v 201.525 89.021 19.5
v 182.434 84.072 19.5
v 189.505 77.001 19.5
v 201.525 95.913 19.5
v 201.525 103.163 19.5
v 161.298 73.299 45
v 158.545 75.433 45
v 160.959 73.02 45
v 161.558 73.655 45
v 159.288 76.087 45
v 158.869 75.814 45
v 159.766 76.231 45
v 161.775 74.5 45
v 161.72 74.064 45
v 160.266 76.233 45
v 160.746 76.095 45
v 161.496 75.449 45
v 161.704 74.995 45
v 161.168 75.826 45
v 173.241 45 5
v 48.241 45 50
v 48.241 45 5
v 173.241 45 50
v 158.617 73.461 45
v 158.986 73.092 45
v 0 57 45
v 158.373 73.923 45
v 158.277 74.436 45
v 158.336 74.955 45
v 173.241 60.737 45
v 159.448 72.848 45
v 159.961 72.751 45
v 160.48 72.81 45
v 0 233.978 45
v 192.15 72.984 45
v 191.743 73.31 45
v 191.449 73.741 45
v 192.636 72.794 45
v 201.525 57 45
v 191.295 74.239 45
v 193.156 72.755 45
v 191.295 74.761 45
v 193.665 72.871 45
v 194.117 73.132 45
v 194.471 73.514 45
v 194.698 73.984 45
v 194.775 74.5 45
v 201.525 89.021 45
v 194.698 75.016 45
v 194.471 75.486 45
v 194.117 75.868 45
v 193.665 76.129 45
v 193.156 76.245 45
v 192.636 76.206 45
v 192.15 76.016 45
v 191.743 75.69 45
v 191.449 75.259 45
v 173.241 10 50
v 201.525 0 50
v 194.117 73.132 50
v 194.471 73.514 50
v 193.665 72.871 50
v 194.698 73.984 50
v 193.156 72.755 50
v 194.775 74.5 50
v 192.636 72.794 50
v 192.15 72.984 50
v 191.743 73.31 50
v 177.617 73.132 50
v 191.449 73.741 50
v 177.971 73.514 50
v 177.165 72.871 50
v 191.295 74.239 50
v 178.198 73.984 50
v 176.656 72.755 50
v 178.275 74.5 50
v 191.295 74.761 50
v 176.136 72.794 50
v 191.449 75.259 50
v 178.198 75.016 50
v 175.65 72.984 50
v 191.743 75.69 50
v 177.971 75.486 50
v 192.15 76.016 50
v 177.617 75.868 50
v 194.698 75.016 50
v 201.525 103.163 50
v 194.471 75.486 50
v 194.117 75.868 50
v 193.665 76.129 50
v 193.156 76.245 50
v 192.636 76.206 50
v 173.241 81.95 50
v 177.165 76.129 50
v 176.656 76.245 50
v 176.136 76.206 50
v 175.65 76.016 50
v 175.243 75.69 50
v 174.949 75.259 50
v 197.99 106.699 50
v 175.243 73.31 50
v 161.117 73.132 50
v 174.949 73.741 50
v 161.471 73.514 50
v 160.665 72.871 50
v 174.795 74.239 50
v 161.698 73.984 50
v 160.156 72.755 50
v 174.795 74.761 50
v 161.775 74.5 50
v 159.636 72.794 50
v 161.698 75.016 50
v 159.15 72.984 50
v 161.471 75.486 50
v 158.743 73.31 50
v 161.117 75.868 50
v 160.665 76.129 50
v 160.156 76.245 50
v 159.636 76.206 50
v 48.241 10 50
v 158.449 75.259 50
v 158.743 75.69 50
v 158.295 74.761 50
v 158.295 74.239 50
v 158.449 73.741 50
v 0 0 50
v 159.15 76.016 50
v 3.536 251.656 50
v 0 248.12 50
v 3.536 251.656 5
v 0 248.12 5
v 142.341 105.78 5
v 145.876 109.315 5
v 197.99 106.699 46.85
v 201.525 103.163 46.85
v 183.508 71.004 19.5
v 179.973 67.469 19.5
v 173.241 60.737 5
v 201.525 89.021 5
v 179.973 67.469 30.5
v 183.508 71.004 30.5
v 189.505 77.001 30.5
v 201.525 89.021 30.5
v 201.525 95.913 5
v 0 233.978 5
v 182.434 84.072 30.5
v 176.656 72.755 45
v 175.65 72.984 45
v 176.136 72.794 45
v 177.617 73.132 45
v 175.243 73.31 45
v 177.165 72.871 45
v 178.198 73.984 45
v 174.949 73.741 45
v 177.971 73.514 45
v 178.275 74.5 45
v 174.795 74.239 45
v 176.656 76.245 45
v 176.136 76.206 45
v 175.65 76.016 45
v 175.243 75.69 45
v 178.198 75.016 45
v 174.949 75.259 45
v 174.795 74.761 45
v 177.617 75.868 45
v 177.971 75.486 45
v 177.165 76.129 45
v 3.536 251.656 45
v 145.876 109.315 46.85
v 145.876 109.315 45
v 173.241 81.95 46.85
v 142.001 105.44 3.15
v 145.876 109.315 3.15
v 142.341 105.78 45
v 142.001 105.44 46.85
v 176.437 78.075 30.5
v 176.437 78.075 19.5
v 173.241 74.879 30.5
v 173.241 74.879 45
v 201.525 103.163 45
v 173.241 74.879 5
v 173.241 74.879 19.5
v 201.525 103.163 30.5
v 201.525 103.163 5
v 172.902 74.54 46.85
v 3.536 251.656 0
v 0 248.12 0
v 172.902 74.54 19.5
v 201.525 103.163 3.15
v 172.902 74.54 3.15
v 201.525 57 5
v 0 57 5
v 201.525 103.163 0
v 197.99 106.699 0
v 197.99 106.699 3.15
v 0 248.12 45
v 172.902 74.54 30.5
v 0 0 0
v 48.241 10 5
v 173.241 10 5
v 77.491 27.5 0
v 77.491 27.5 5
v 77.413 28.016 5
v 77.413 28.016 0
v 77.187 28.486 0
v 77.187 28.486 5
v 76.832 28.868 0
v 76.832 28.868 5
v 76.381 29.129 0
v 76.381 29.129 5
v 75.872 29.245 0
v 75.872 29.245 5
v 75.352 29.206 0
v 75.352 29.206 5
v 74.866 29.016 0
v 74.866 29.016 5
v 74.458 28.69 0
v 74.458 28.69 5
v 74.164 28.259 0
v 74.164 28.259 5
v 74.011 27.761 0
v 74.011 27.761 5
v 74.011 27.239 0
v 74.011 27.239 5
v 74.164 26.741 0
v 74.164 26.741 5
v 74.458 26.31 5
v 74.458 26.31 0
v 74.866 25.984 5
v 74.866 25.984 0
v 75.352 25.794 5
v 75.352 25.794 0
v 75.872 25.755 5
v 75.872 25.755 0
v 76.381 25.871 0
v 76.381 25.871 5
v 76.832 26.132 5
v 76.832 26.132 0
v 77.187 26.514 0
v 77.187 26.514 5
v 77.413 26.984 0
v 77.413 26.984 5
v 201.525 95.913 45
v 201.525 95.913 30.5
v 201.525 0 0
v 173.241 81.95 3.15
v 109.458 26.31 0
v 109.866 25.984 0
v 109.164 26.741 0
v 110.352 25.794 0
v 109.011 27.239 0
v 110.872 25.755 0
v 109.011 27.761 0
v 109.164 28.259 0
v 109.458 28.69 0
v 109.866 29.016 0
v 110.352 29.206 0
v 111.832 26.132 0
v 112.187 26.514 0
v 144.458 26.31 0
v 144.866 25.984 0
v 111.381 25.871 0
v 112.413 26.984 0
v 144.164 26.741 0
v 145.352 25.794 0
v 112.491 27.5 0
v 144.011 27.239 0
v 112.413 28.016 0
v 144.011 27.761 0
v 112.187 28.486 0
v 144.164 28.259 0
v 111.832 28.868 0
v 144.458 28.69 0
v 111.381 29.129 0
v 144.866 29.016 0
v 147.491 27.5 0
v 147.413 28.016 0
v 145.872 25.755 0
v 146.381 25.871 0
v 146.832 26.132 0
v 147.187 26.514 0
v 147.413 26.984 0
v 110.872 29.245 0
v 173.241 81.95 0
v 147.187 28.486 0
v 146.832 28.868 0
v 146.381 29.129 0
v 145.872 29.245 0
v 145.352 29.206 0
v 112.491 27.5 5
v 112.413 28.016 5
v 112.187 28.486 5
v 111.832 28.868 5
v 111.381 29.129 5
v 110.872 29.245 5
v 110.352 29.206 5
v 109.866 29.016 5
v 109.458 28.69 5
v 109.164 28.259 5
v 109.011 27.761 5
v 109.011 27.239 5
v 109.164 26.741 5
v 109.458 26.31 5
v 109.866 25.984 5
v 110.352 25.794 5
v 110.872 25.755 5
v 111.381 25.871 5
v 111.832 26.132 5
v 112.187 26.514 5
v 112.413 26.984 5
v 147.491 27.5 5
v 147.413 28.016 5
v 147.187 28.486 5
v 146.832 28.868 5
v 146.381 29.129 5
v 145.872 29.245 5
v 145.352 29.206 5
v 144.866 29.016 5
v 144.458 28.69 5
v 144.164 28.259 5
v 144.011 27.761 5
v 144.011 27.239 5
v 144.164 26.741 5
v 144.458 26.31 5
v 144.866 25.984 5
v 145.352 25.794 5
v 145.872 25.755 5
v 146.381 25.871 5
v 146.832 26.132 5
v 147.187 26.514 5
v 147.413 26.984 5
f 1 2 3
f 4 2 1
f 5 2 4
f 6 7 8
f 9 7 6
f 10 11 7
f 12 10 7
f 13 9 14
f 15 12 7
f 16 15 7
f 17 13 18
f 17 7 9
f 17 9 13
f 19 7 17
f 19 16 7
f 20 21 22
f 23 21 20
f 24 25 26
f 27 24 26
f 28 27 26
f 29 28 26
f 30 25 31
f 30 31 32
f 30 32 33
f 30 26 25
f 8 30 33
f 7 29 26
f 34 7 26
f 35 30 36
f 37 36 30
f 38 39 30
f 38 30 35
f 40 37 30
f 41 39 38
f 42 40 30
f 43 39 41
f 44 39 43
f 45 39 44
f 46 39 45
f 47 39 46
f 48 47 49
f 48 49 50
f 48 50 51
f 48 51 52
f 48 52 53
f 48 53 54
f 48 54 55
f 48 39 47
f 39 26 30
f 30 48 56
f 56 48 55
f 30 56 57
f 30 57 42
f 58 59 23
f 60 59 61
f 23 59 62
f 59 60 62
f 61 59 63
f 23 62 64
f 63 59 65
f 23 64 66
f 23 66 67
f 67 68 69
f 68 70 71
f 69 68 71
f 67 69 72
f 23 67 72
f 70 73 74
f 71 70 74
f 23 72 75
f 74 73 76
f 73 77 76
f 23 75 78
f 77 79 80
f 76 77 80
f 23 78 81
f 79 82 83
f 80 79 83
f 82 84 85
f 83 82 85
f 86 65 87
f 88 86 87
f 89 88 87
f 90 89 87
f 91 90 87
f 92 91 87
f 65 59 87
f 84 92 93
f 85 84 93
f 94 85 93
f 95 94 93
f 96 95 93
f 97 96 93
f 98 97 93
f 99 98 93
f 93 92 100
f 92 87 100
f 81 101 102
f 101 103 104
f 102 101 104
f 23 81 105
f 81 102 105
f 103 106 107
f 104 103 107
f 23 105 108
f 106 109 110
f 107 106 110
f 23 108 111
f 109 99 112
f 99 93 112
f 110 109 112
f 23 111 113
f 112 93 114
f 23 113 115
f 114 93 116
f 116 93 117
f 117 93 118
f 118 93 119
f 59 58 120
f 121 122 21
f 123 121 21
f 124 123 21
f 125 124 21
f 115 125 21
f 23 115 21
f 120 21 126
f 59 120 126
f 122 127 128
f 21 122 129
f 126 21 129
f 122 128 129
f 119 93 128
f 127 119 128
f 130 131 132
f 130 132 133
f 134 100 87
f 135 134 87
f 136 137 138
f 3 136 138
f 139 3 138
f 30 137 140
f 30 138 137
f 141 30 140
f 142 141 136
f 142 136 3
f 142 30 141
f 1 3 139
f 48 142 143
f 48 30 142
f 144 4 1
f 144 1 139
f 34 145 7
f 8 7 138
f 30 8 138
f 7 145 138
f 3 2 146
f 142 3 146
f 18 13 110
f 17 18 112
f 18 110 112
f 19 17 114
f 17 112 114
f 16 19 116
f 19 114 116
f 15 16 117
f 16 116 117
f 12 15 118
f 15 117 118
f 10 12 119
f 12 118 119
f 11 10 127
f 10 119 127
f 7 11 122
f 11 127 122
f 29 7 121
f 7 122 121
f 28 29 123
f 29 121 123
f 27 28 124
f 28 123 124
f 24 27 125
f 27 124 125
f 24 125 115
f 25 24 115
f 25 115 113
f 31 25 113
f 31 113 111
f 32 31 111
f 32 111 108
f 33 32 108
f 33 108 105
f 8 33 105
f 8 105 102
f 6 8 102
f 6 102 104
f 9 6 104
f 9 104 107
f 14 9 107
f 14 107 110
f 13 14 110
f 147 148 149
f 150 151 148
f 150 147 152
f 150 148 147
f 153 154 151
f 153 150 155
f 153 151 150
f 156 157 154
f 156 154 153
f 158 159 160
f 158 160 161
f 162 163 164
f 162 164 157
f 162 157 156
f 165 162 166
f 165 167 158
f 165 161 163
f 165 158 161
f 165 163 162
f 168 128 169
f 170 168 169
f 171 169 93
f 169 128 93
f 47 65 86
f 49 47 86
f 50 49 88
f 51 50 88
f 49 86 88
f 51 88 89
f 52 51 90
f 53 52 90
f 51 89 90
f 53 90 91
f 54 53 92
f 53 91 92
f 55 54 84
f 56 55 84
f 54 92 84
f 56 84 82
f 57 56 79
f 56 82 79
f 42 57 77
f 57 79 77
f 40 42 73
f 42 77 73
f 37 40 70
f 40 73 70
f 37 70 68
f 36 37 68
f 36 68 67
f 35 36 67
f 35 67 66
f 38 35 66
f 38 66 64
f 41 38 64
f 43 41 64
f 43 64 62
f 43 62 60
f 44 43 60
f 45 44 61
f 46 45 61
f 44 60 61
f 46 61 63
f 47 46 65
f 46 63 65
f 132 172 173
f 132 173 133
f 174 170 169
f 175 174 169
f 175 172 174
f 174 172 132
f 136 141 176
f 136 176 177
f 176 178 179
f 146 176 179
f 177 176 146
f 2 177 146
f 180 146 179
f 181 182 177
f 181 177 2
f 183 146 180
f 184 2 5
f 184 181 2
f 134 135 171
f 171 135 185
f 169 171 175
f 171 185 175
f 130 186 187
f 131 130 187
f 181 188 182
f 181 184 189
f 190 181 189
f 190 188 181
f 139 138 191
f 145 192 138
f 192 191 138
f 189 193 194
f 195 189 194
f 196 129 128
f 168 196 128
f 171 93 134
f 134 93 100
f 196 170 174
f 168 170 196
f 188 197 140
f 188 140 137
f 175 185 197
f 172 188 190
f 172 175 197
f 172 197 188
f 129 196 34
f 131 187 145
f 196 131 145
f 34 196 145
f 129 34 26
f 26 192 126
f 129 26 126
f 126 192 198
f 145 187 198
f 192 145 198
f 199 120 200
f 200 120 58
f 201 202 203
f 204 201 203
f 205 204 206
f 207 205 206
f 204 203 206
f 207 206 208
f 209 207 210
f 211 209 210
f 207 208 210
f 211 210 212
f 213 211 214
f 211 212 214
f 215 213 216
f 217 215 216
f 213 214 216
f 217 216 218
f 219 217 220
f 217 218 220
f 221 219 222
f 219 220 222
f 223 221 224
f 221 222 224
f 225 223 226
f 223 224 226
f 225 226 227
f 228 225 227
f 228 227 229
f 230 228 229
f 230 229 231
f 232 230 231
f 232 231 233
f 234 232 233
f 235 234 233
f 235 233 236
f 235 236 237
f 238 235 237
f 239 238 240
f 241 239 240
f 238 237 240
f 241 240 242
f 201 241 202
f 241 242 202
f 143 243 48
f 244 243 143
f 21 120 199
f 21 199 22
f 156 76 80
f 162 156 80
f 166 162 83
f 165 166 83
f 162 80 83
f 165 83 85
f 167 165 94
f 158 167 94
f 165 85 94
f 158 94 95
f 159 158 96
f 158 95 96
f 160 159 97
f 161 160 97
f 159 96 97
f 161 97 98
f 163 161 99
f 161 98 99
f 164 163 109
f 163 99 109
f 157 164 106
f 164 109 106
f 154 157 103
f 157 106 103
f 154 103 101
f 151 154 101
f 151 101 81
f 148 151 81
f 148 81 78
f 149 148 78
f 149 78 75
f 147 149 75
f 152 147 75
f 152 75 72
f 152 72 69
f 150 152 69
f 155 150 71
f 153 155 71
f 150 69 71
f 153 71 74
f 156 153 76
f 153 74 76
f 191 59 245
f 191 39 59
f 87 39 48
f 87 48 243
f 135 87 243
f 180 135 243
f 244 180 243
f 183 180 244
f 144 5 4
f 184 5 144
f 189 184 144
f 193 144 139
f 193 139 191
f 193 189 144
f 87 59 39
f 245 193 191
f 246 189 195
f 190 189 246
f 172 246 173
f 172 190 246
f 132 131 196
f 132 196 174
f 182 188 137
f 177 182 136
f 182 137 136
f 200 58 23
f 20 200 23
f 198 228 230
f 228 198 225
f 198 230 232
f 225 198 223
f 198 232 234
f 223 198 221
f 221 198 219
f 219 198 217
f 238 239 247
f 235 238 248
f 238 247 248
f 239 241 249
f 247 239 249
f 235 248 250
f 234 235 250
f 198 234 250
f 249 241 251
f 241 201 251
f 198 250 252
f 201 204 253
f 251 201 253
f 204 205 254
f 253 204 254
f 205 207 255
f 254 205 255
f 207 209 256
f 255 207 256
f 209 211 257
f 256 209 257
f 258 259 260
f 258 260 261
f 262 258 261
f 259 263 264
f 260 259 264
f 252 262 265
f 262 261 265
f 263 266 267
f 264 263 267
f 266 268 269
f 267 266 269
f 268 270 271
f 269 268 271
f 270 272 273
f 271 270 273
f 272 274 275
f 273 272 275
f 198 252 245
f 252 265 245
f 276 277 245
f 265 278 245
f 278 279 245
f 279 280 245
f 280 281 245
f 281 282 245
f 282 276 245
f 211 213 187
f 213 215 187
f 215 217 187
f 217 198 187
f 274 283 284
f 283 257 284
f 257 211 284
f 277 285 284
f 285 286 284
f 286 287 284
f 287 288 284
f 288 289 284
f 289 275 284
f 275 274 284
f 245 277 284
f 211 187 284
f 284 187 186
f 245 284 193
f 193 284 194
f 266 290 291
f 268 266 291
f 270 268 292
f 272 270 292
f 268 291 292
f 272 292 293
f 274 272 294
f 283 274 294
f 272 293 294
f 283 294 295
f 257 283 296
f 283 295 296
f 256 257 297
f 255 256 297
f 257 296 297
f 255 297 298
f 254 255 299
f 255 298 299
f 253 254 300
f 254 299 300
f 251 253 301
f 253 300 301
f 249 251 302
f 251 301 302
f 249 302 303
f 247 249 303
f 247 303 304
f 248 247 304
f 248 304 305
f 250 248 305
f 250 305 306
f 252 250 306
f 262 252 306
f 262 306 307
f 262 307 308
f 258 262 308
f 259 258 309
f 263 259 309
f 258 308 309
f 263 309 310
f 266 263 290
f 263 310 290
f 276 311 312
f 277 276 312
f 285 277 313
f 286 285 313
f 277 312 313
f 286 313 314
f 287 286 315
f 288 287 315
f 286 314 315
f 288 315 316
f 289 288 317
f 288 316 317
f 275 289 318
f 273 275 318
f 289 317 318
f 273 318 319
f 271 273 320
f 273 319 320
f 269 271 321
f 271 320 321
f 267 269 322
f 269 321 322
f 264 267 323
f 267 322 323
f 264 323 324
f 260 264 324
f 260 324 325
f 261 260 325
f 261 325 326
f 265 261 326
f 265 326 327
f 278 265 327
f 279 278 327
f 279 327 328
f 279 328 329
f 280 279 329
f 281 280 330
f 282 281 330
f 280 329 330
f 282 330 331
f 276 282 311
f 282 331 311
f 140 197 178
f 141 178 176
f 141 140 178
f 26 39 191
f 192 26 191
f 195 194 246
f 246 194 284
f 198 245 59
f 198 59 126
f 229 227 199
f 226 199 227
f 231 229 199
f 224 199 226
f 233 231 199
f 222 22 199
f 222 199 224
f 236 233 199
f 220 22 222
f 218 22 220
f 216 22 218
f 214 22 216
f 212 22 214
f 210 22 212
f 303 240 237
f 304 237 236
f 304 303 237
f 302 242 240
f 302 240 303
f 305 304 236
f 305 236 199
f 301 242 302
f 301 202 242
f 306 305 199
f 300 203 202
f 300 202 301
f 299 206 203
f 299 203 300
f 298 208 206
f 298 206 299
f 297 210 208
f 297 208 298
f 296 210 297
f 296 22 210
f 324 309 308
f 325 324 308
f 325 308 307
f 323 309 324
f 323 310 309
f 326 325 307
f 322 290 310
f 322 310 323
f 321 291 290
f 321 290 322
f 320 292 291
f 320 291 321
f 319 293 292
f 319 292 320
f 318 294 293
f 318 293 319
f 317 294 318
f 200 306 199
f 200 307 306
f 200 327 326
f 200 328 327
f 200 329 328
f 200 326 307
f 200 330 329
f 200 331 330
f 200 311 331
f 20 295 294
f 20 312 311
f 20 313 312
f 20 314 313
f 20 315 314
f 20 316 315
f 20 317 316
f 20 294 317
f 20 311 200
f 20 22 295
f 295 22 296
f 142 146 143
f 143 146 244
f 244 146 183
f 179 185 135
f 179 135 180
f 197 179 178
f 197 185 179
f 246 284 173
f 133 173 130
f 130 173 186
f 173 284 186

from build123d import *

# Parameters (mm, degrees)
BOSS_EXTRUDE1_DEPTH              = 50
CUT_EXTRUDE1_REACH               = 346.227
CUT_EXTRUDE1_OFFSET_FROM_SURFACE = 10
SKETCH7_W                        = 40
SKETCH7_H                        = 243.120368846
CUT_EXTRUDE2_REACH               = 336.227
SKETCH8_W                        = 40
SKETCH8_H                        = 80.210678119
BOSS_EXTRUDE2_DEPTH              = 5
BOSS_EXTRUDE3_DEPTH              = 5
SKETCH12_W                       = 11
SKETCH12_H                       = 50
CUT_EXTRUDE3_DEPTH               = 20
SKETCH13_W                       = 50
SKETCH13_H                       = 57
BOSS_EXTRUDE4_DEPTH              = 218.275432638
CUT_EXTRUDE5_DEPTH               = 185.855610396
CUT_EXTRUDE5_DEPTH_BACK          = 0.48
SKETCH14_W                       = 40
SKETCH14_H                       = 43.7
SKETCH14_W_2                     = 1.85
CUT_EXTRUDE6_START               = -10
SKETCH15_W                       = 5.5
SKETCH15_H                       = 5
CUT_EXTRUDE6_DEPTH               = 10
SKETCH16_W                       = 125
SKETCH16_H                       = 35
CUT_EXTRUDE7_DEPTH               = 45
CUT_EXTRUDE8_DEPTH               = 5
CUT_EXTRUDE9_DEPTH               = 16.750003
CUT_EXTRUDE10_REACH              = 266.941
SKETCH19_W                       = 6.892135624
SKETCH19_H                       = 14.5
SKETCH20_R                       = 1.75
CUT_EXTRUDE11_DEPTH              = 5


with BuildPart() as part:
    # Sketch2 → Boss-Extrude1 (new body)
    with BuildSketch(Plane.XY):
        Polygon((218.275432638, 103.163478703), (218.275432638, 0), (0, 0), (0, 44.039493547), (0, 248.120368846), (173.241161391, 74.879207455), (201.525432638, 103.163478703), align=None)
    extrude(amount=BOSS_EXTRUDE1_DEPTH)

    # Cut-Extrude1: up to this face of the body (flat: up to its plane, moved by the offset)
    cut_extrude1_end = Plane(part.part.faces().sort_by_distance((86.620580695, 161.499788151, 25))[0]).offset(-CUT_EXTRUDE1_OFFSET_FROM_SURFACE)
    # Sketch7 → Cut-Extrude1 (cut, up to the picked face)
    with BuildSketch(Plane.ZY, mode=Mode.PRIVATE) as cut_extrude1_sk1:
        with Locations((25, 121.560184423)):
            Rectangle(SKETCH7_W, SKETCH7_H)
    cut_extrude1_tool1 = split(extrude(cut_extrude1_sk1.sketch, amount=-CUT_EXTRUDE1_REACH, mode=Mode.PRIVATE), bisect_by=cut_extrude1_end, keep=Keep.BOTH, mode=Mode.PRIVATE)
    add(cut_extrude1_tool1.solids().sort_by(Axis((0, 121.560184, 25), (1, 0, 0)))[0], mode=Mode.SUBTRACT)

    # Cut-Extrude2: up to this plane
    cut_extrude2_end = Plane(origin=(180.312229203, 67.808139643, 50), z_dir=(0.7071067811865477, -0.7071067811865474, 0))
    # Sketch8 → Cut-Extrude2 (cut, up to the surface)
    with BuildSketch(Plane(origin=(218.275432638, 0, 0), x_dir=(0, 0, -1), z_dir=(1, 0, 0)), mode=Mode.PRIVATE) as cut_extrude2_sk1:
        with Locations((-25, 55.808139644)):
            Rectangle(SKETCH8_W, SKETCH8_H)
    cut_extrude2_tool1 = split(extrude(cut_extrude2_sk1.sketch, amount=-CUT_EXTRUDE2_REACH, mode=Mode.PRIVATE), bisect_by=cut_extrude2_end, keep=Keep.BOTH, mode=Mode.PRIVATE)
    add(cut_extrude2_tool1.solids().sort_by_distance((218.275433, 55.80814, 25))[0], mode=Mode.SUBTRACT)

    # Sketch10 → Boss-Extrude2 (add)
    with BuildSketch(Plane.XY.offset(50)):
        Polygon((0, 248.120368846), (3.535533906, 251.655902752), (173.241161391, 81.950275267), (197.989898732, 106.699012609), (201.525432638, 103.163478703), (173.241161391, 74.879207455), align=None)
    extrude(amount=-BOSS_EXTRUDE2_DEPTH)

    # Sketch11 → Boss-Extrude3 (add)
    with BuildSketch(Plane(origin=(0, 0, 0), x_dir=(-1, 0, 0), z_dir=(0, 0, -1))):
        Polygon((-201.525432638, 103.163478703), (-197.989898732, 106.699012609), (-173.241161391, 81.950275267), (-3.535533906, 251.655902752), (0, 248.120368846), (-173.241161391, 74.879207455), align=None)
    extrude(amount=-BOSS_EXTRUDE3_DEPTH)

    # Sketch12 → Cut-Extrude3 (cut)
    with BuildSketch(Plane(origin=(49.180976968, -49.180976968, 0), x_dir=(0, 0, 1), z_dir=(-0.7071067811865435, 0.7071067811865517, 0))):
        with Locations((25, 213.447595361)):
            Rectangle(SKETCH12_W, SKETCH12_H)
    extrude(amount=-CUT_EXTRUDE3_DEPTH, mode=Mode.SUBTRACT)

    # Sketch13 → Boss-Extrude4 (add)
    with BuildSketch(Plane(origin=(218.275432638, 0, 0), x_dir=(0, 0, -1), z_dir=(1, 0, 0))):
        with Locations((-25, 28.5)):
            Rectangle(SKETCH13_W, SKETCH13_H)
    extrude(amount=-BOSS_EXTRUDE4_DEPTH)

    # Sketch14 → Cut-Extrude5 (cut, two sides: drawn at the far end of the back side and taken through both)
    with BuildSketch(Plane(origin=(124.060184423, 124.060184423, 0), x_dir=(0, 0, -1), z_dir=(0.7071067811865435, 0.7071067811865517, 0)).offset(-CUT_EXTRUDE5_DEPTH_BACK)):
        with Locations((-25, -47.702404639)):
            Rectangle(SKETCH14_W, SKETCH14_H)
        with Locations((-45.925, -47.702404639)):
            Rectangle(SKETCH14_W_2, SKETCH14_H)
        with Locations((-4.075, -47.702404639)):
            Rectangle(SKETCH14_W_2, SKETCH14_H)
    extrude(amount=CUT_EXTRUDE5_DEPTH + CUT_EXTRUDE5_DEPTH_BACK, mode=Mode.SUBTRACT)

    # Sketch15 → Cut-Extrude6 (cut)
    with BuildSketch(Plane(origin=(49.180976968, -49.180976968, 0), x_dir=(0, 0, 1), z_dir=(-0.7071067811865477, 0.7071067811865474, 0)).offset(CUT_EXTRUDE6_START)):
        with Locations((27.75, 177.467595361)):
            Rectangle(SKETCH15_W, SKETCH15_H)
        with Locations((22.25, 177.467595361)):
            Rectangle(SKETCH15_W, SKETCH15_H)
    extrude(amount=CUT_EXTRUDE6_DEPTH, mode=Mode.SUBTRACT)

    # Sketch16 → Cut-Extrude7 (cut)
    with BuildSketch(Plane.XY.offset(50)):
        with Locations((110.741161391, 27.5)):
            Rectangle(SKETCH16_W, SKETCH16_H)
    extrude(amount=-CUT_EXTRUDE7_DEPTH, mode=Mode.SUBTRACT)

    # Sketch17 → Cut-Extrude8 (cut)
    with BuildSketch(Plane.XY.offset(5)):
        with BuildLine():
            ThreePointArc((73.991161391, 27.5), (75.741161391, 25.75), (77.491161391, 27.5))
            Line((77.491161391, 27.5), (73.991161391, 27.5))
        make_face()
        with BuildLine():
            Line((73.991161391, 27.5), (77.491161391, 27.5))
            ThreePointArc((77.491161391, 27.5), (75.741161391, 29.25), (73.991161391, 27.5))
        make_face()
        with BuildLine():
            ThreePointArc((108.991161391, 27.5), (110.741161391, 25.75), (112.491161391, 27.5))
            Line((112.491161391, 27.5), (108.991161391, 27.5))
        make_face()
        with BuildLine():
            Line((108.991161391, 27.5), (112.491161391, 27.5))
            ThreePointArc((112.491161391, 27.5), (110.741161391, 29.25), (108.991161391, 27.5))
        make_face()
        with BuildLine():
            ThreePointArc((143.991161391, 27.5), (145.741161391, 25.75), (147.491161391, 27.5))
            Line((147.491161391, 27.5), (143.991161391, 27.5))
        make_face()
        with BuildLine():
            Line((143.991161391, 27.5), (147.491161391, 27.5))
            ThreePointArc((147.491161391, 27.5), (145.741161391, 29.25), (143.991161391, 27.5))
        make_face()
    extrude(amount=-CUT_EXTRUDE8_DEPTH, mode=Mode.SUBTRACT)

    # Sketch18 → Cut-Extrude9 (cut)
    with BuildSketch(Plane(origin=(218.275432638, 0, 0), x_dir=(0, 0, -1), z_dir=(1, 0, 0))):
        Polygon((-5, 95.913478703), (-5, 57), (-45, 57), (-45, 95.913478703), (-30.5, 95.913478703), (-30.5, 103.163478703), (-50, 103.163478703), (-50, 0), (0, 0), (0, 103.163478703), (-19.5, 103.163478703), (-19.5, 95.913478703), align=None)
    extrude(amount=-CUT_EXTRUDE9_DEPTH, mode=Mode.SUBTRACT)

    # Sketch19 → Cut-Extrude10 (cut, up to next)
    with BuildSketch(Plane(origin=(0, 95.913478703, 0), x_dir=(1, 0, 0), z_dir=(0, 1, 0)), mode=Mode.PRIVATE) as cut_extrude10_sk1:
        with Locations((204.97150045, -37.75)):
            Rectangle(SKETCH19_W, SKETCH19_H)
    cut_extrude10_tool1 = extrude(cut_extrude10_sk1.sketch, amount=-CUT_EXTRUDE10_REACH, mode=Mode.PRIVATE) & part.part
    # Sketch19 → Cut-Extrude10 (cut, up to next)
    with BuildSketch(Plane(origin=(0, 95.913478703, 0), x_dir=(1, 0, 0), z_dir=(0, 1, 0)), mode=Mode.PRIVATE) as cut_extrude10_sk2:
        with Locations((204.97150045, -12.25)):
            Rectangle(SKETCH19_W, SKETCH19_H)
    cut_extrude10_tool2 = extrude(cut_extrude10_sk2.sketch, amount=-CUT_EXTRUDE10_REACH, mode=Mode.PRIVATE) & part.part
    add(cut_extrude10_tool1.solids().sort_by_distance((204.9715, 95.913479, 37.75))[0], mode=Mode.SUBTRACT)
    add(cut_extrude10_tool2.solids().sort_by_distance((204.9715, 95.913479, 12.25))[0], mode=Mode.SUBTRACT)

    # Sketch20 → Cut-Extrude11 (cut)
    with BuildSketch(Plane.XY.offset(50)):
        with Locations((176.525432638, 74.5)):
            Circle(SKETCH20_R)
        with Locations((160.025432638, 74.5)):
            Circle(SKETCH20_R)
        with Locations((193.025432638, 74.5)):
            Circle(SKETCH20_R)
    extrude(amount=-CUT_EXTRUDE11_DEPTH, mode=Mode.SUBTRACT)


solid = part.part
